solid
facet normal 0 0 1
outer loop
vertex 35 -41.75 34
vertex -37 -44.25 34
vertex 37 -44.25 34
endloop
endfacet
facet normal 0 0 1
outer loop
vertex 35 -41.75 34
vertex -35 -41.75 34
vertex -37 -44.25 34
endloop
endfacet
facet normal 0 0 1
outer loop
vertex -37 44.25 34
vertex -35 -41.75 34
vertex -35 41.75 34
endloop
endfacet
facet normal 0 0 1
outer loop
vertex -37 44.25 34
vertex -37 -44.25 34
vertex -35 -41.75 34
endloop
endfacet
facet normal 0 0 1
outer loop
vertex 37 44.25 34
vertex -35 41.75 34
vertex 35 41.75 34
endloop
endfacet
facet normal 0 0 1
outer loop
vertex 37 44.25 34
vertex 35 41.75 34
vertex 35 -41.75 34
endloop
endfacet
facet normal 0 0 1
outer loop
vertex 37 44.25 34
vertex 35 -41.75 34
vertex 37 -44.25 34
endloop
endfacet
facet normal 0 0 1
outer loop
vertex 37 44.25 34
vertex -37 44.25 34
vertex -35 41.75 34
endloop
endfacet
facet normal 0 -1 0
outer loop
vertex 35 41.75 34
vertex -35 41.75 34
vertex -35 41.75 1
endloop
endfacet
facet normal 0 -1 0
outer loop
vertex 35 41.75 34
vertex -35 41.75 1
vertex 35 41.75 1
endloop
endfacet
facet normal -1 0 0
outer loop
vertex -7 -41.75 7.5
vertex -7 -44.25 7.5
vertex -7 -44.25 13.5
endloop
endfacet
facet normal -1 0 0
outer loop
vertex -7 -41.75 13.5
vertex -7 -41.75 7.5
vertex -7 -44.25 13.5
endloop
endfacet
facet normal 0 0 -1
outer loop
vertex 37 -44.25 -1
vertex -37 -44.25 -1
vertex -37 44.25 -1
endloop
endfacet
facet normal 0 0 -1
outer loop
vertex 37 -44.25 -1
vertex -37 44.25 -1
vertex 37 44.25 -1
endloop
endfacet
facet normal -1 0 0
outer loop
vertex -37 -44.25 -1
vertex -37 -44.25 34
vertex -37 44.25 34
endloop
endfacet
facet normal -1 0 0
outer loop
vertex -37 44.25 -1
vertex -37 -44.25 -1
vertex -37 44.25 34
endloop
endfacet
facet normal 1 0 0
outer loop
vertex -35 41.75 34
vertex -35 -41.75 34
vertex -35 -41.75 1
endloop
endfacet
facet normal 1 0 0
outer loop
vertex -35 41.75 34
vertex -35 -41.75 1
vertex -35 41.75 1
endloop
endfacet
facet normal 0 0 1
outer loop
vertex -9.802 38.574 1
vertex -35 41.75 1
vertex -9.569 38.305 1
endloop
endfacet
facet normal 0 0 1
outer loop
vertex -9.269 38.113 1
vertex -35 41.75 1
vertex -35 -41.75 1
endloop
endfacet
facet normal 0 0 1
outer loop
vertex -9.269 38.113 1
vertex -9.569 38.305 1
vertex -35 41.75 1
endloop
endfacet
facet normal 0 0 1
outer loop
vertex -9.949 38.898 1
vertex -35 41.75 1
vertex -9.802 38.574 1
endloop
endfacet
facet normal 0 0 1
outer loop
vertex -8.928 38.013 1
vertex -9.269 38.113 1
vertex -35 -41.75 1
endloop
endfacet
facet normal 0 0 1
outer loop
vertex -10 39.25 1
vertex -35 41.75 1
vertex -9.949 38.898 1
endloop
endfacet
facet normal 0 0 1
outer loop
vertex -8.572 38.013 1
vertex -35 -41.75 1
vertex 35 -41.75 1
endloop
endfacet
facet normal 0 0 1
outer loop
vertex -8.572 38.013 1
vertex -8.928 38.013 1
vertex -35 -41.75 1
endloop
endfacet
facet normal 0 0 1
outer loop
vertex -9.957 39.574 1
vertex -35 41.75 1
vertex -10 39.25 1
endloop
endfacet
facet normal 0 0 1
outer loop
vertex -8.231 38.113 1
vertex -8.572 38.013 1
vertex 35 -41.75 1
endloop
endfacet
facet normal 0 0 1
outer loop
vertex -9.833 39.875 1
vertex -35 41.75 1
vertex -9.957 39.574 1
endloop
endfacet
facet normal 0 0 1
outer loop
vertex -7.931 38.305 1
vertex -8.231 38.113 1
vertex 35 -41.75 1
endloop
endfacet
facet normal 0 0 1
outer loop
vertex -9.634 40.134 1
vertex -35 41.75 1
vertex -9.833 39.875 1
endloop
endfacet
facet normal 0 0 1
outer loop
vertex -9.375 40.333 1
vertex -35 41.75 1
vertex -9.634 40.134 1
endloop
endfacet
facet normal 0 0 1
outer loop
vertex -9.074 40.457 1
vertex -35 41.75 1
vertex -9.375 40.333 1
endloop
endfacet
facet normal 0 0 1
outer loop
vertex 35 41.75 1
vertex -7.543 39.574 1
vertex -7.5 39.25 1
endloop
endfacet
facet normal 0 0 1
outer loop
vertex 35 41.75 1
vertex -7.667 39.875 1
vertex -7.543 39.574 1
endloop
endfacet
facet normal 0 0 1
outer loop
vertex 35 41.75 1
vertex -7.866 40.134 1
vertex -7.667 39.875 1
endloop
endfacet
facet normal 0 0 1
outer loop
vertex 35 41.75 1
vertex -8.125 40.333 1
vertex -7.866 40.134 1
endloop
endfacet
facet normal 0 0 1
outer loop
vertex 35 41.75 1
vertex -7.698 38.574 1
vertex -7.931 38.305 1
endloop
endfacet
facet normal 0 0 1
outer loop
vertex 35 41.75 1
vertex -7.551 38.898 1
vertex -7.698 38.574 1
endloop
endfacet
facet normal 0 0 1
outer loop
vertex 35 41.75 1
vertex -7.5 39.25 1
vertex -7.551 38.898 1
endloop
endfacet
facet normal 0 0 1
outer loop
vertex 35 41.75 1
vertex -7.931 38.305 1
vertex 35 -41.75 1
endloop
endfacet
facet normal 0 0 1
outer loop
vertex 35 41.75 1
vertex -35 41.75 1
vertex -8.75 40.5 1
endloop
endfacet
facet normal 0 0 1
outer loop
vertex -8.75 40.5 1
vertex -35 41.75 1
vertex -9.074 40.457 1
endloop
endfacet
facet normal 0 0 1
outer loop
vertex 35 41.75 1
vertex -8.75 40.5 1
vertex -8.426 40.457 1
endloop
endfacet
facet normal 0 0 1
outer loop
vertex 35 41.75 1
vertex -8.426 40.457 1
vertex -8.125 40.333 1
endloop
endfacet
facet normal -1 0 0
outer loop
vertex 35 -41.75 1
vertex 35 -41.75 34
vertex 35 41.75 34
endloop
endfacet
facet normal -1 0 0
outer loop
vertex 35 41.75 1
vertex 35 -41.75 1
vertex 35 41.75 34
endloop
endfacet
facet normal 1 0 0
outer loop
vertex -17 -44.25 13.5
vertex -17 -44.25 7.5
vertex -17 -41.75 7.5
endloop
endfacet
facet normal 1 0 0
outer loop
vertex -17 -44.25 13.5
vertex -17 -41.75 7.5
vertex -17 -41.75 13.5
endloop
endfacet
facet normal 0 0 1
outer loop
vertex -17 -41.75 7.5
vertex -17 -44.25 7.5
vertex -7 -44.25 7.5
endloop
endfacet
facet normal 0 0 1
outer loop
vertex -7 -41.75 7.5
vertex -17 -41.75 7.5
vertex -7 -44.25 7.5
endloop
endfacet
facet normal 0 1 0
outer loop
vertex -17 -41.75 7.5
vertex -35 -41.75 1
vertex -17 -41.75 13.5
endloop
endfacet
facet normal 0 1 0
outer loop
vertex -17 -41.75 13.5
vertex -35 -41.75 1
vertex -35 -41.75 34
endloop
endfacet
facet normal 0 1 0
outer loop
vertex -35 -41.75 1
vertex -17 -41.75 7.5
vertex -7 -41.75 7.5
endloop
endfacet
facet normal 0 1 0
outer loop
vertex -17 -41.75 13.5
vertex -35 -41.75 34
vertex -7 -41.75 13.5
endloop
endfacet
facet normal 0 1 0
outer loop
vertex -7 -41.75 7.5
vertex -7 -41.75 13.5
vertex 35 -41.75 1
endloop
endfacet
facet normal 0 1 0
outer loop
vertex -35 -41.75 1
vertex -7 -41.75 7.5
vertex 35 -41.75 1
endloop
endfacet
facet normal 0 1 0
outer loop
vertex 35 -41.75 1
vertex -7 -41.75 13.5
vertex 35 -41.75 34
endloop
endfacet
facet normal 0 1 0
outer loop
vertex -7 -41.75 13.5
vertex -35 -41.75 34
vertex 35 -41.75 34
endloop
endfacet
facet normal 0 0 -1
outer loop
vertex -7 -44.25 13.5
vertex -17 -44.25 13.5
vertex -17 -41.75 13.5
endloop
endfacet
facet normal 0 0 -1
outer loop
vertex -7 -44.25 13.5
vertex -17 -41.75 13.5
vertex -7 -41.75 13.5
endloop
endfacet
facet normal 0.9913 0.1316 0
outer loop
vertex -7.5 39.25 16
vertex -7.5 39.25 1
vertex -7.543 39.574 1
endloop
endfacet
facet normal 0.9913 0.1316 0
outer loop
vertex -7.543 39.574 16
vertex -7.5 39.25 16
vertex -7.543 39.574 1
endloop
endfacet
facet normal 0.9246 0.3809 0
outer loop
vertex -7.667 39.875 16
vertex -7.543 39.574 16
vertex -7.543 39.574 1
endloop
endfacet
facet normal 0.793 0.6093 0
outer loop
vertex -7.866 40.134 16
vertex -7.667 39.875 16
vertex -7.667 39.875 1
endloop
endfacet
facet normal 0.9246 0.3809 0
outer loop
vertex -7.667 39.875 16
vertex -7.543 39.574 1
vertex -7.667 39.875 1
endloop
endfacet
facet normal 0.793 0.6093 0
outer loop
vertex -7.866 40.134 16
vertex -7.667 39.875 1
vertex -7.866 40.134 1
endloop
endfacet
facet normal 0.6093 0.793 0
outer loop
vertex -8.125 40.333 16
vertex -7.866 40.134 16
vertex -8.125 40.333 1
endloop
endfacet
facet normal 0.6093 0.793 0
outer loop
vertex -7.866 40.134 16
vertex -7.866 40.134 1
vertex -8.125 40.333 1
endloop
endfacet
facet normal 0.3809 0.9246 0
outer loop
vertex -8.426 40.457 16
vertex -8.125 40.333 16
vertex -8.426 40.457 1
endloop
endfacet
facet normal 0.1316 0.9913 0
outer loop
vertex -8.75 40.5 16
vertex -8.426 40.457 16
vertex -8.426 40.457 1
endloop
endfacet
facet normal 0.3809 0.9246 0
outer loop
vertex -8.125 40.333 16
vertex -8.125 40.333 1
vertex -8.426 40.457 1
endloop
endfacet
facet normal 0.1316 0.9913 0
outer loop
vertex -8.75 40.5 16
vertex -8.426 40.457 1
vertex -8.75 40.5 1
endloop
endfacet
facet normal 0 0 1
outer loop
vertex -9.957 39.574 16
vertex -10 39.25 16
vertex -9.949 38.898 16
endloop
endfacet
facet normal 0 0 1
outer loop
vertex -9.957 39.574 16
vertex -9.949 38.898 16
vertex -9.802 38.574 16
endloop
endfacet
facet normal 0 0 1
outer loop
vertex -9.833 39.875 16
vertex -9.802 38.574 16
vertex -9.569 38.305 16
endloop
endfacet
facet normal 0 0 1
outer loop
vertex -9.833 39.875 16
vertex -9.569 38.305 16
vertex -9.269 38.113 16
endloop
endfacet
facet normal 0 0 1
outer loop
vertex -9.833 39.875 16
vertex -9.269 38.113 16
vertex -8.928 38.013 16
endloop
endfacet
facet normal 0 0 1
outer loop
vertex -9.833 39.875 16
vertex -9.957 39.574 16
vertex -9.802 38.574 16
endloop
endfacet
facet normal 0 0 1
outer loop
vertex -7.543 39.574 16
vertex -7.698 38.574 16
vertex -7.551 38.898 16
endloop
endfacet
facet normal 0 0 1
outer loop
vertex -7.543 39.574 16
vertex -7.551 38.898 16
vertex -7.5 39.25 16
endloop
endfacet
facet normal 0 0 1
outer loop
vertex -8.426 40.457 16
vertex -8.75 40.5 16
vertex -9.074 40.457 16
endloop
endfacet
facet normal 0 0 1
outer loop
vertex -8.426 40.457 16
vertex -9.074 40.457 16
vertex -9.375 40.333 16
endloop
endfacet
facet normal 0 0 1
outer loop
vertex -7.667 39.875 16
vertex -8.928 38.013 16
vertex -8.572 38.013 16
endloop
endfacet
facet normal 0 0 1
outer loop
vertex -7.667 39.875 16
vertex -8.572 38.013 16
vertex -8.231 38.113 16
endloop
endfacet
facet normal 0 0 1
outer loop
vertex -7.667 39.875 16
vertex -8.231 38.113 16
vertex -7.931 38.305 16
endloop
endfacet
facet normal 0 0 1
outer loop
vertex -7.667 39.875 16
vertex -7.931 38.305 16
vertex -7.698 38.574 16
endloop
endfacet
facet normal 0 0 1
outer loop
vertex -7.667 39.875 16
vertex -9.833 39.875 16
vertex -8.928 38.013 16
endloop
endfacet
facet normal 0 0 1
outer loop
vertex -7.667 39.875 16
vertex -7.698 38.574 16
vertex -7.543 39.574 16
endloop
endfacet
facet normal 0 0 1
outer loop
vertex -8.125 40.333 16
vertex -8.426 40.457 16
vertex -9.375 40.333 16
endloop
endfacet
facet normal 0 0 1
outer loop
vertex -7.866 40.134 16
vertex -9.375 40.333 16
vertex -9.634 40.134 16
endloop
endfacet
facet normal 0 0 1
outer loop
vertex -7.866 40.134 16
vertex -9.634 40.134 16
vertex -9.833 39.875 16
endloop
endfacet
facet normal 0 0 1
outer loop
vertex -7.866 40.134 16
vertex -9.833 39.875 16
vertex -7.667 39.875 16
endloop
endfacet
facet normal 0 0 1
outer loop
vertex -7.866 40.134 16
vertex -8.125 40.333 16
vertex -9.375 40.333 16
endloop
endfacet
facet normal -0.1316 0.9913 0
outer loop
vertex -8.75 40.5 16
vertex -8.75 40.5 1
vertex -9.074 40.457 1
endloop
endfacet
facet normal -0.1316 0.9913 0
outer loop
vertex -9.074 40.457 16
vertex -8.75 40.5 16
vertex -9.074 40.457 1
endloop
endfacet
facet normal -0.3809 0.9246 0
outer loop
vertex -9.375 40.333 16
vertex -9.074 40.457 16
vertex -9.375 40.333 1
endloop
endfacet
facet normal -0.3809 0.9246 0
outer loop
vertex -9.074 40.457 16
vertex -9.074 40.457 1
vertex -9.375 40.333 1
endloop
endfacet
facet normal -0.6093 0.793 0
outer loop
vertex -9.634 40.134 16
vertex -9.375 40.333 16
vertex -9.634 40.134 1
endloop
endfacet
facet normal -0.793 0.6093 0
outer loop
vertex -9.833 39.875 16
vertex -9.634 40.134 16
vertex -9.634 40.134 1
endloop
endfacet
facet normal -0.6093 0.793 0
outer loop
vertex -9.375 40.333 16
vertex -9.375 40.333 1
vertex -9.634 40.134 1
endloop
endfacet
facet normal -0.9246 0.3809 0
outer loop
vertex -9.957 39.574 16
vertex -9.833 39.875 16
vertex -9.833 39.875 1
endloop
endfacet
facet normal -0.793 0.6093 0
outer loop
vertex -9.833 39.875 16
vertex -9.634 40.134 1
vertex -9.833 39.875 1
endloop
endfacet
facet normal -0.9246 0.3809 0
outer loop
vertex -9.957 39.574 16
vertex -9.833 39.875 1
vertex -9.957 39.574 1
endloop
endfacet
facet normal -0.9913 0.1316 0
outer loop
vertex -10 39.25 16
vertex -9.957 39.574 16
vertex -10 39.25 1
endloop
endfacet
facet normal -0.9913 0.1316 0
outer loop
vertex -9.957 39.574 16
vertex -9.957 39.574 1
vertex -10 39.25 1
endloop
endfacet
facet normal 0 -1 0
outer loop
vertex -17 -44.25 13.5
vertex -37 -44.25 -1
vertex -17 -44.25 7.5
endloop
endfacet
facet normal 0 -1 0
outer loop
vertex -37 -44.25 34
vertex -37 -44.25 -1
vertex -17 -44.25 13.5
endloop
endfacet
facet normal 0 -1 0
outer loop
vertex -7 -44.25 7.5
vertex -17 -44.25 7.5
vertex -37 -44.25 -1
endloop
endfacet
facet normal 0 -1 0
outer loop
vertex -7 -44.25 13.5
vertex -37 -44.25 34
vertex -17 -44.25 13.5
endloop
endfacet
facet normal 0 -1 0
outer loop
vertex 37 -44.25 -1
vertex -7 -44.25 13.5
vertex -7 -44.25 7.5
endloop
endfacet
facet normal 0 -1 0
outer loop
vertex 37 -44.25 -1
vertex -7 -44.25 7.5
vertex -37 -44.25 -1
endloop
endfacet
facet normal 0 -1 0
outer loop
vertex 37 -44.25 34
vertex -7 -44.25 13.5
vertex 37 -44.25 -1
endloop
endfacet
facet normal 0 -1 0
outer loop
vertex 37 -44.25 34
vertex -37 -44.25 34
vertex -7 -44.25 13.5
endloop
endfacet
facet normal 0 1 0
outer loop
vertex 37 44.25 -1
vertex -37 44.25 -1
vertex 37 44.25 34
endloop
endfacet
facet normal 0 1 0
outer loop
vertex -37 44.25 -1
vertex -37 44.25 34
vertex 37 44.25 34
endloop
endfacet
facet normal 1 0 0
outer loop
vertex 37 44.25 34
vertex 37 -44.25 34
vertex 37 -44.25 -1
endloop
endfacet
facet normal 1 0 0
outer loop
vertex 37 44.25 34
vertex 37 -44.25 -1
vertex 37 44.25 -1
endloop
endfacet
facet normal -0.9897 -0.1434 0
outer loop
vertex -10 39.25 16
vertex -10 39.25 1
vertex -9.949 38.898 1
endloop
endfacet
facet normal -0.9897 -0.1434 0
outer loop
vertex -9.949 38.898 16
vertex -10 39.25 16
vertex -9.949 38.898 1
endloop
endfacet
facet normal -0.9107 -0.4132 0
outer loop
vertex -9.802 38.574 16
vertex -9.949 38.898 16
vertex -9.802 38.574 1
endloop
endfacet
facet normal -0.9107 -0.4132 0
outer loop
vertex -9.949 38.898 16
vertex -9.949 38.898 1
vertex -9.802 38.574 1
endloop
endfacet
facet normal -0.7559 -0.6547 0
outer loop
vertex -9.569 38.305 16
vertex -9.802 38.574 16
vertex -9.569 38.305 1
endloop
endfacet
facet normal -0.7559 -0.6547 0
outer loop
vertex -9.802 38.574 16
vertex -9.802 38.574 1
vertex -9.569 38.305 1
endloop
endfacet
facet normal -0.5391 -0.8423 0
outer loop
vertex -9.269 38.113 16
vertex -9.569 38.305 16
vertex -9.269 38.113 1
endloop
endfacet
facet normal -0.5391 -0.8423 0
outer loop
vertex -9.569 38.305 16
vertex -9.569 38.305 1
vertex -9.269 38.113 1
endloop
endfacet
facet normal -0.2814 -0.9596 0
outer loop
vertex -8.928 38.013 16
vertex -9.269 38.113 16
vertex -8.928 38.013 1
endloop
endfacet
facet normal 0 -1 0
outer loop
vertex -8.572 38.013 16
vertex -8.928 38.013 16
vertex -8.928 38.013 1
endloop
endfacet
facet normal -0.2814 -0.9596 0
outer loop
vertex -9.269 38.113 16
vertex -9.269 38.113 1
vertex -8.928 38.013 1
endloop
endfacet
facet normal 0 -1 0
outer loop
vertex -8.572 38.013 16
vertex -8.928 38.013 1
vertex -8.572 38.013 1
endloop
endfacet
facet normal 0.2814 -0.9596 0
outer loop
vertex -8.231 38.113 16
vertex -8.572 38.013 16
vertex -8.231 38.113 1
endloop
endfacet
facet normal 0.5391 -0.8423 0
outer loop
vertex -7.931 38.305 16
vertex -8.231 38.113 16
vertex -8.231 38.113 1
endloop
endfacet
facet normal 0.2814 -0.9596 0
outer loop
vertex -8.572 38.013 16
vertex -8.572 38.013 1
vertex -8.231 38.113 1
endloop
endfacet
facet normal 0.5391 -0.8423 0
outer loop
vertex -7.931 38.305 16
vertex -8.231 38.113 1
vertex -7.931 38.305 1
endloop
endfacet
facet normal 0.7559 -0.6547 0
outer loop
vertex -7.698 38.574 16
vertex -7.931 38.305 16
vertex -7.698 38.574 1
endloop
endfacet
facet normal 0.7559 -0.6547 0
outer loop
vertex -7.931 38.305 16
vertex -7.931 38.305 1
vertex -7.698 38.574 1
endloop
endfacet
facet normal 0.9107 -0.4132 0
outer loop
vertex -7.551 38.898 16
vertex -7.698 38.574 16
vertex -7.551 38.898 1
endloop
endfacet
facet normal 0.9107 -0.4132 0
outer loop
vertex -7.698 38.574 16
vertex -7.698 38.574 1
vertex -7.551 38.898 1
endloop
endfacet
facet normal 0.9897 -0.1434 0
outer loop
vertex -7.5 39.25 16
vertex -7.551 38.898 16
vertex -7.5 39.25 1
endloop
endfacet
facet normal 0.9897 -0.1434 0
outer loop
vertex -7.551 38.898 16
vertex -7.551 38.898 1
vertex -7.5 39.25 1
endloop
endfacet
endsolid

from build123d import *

# Parameters (mm, degrees)
F0_W     = 74
F0_H     = 88.5
F1_DEPTH = 34
F2_W     = 70
F2_H     = 83.5
F3_DEPTH = 33
F5_DEPTH = 15
F6_DEPTH = 1
F7_W     = 10
F7_H     = 6
F8_DEPTH = 25


with BuildPart() as f1:
    # F0 (on Top) → F1 (new body)
    with BuildSketch(Plane.XY):
        Rectangle(F0_W, F0_H)
    extrude(amount=F1_DEPTH)

    # F2 (on face) → F3 (cut)
    with BuildSketch(Plane.XY.offset(34)):
        Rectangle(F2_W, F2_H)
    extrude(amount=-F3_DEPTH, mode=Mode.SUBTRACT)

    # F4 (on face) → F5 (join)
    with BuildSketch(Plane.XY.offset(1)):
        with BuildLine():
            ThreePointArc((-7.5, 39.25), (-7.866117, 40.133883), (-8.75, 40.5))
            Line((-8.75, 40.5), (-8.75, 39.25))
            Line((-8.75, 39.25), (-10, 39.25))
            ThreePointArc((-10, 39.25), (-8.75, 38), (-7.5, 39.25))
        make_face()
        with BuildLine():
            Line((-8.75, 39.25), (-8.75, 40.5))
            ThreePointArc((-8.75, 40.5), (-9.633883, 40.133883), (-10, 39.25))
            Line((-10, 39.25), (-8.75, 39.25))
        make_face()
    extrude(amount=F5_DEPTH)

    # F0 (on Top) → F6 (join)
    with BuildSketch(Plane.XY):
        Rectangle(F0_W, F0_H)
    extrude(amount=-F6_DEPTH)

    # F7 (on face) → F8 (cut)
    with BuildSketch(Plane.XZ.offset(44.25)):
        with Locations((-12, 10.5)):
            Rectangle(F7_W, F7_H)
    extrude(amount=-F8_DEPTH, mode=Mode.SUBTRACT)


solid = f1.part
